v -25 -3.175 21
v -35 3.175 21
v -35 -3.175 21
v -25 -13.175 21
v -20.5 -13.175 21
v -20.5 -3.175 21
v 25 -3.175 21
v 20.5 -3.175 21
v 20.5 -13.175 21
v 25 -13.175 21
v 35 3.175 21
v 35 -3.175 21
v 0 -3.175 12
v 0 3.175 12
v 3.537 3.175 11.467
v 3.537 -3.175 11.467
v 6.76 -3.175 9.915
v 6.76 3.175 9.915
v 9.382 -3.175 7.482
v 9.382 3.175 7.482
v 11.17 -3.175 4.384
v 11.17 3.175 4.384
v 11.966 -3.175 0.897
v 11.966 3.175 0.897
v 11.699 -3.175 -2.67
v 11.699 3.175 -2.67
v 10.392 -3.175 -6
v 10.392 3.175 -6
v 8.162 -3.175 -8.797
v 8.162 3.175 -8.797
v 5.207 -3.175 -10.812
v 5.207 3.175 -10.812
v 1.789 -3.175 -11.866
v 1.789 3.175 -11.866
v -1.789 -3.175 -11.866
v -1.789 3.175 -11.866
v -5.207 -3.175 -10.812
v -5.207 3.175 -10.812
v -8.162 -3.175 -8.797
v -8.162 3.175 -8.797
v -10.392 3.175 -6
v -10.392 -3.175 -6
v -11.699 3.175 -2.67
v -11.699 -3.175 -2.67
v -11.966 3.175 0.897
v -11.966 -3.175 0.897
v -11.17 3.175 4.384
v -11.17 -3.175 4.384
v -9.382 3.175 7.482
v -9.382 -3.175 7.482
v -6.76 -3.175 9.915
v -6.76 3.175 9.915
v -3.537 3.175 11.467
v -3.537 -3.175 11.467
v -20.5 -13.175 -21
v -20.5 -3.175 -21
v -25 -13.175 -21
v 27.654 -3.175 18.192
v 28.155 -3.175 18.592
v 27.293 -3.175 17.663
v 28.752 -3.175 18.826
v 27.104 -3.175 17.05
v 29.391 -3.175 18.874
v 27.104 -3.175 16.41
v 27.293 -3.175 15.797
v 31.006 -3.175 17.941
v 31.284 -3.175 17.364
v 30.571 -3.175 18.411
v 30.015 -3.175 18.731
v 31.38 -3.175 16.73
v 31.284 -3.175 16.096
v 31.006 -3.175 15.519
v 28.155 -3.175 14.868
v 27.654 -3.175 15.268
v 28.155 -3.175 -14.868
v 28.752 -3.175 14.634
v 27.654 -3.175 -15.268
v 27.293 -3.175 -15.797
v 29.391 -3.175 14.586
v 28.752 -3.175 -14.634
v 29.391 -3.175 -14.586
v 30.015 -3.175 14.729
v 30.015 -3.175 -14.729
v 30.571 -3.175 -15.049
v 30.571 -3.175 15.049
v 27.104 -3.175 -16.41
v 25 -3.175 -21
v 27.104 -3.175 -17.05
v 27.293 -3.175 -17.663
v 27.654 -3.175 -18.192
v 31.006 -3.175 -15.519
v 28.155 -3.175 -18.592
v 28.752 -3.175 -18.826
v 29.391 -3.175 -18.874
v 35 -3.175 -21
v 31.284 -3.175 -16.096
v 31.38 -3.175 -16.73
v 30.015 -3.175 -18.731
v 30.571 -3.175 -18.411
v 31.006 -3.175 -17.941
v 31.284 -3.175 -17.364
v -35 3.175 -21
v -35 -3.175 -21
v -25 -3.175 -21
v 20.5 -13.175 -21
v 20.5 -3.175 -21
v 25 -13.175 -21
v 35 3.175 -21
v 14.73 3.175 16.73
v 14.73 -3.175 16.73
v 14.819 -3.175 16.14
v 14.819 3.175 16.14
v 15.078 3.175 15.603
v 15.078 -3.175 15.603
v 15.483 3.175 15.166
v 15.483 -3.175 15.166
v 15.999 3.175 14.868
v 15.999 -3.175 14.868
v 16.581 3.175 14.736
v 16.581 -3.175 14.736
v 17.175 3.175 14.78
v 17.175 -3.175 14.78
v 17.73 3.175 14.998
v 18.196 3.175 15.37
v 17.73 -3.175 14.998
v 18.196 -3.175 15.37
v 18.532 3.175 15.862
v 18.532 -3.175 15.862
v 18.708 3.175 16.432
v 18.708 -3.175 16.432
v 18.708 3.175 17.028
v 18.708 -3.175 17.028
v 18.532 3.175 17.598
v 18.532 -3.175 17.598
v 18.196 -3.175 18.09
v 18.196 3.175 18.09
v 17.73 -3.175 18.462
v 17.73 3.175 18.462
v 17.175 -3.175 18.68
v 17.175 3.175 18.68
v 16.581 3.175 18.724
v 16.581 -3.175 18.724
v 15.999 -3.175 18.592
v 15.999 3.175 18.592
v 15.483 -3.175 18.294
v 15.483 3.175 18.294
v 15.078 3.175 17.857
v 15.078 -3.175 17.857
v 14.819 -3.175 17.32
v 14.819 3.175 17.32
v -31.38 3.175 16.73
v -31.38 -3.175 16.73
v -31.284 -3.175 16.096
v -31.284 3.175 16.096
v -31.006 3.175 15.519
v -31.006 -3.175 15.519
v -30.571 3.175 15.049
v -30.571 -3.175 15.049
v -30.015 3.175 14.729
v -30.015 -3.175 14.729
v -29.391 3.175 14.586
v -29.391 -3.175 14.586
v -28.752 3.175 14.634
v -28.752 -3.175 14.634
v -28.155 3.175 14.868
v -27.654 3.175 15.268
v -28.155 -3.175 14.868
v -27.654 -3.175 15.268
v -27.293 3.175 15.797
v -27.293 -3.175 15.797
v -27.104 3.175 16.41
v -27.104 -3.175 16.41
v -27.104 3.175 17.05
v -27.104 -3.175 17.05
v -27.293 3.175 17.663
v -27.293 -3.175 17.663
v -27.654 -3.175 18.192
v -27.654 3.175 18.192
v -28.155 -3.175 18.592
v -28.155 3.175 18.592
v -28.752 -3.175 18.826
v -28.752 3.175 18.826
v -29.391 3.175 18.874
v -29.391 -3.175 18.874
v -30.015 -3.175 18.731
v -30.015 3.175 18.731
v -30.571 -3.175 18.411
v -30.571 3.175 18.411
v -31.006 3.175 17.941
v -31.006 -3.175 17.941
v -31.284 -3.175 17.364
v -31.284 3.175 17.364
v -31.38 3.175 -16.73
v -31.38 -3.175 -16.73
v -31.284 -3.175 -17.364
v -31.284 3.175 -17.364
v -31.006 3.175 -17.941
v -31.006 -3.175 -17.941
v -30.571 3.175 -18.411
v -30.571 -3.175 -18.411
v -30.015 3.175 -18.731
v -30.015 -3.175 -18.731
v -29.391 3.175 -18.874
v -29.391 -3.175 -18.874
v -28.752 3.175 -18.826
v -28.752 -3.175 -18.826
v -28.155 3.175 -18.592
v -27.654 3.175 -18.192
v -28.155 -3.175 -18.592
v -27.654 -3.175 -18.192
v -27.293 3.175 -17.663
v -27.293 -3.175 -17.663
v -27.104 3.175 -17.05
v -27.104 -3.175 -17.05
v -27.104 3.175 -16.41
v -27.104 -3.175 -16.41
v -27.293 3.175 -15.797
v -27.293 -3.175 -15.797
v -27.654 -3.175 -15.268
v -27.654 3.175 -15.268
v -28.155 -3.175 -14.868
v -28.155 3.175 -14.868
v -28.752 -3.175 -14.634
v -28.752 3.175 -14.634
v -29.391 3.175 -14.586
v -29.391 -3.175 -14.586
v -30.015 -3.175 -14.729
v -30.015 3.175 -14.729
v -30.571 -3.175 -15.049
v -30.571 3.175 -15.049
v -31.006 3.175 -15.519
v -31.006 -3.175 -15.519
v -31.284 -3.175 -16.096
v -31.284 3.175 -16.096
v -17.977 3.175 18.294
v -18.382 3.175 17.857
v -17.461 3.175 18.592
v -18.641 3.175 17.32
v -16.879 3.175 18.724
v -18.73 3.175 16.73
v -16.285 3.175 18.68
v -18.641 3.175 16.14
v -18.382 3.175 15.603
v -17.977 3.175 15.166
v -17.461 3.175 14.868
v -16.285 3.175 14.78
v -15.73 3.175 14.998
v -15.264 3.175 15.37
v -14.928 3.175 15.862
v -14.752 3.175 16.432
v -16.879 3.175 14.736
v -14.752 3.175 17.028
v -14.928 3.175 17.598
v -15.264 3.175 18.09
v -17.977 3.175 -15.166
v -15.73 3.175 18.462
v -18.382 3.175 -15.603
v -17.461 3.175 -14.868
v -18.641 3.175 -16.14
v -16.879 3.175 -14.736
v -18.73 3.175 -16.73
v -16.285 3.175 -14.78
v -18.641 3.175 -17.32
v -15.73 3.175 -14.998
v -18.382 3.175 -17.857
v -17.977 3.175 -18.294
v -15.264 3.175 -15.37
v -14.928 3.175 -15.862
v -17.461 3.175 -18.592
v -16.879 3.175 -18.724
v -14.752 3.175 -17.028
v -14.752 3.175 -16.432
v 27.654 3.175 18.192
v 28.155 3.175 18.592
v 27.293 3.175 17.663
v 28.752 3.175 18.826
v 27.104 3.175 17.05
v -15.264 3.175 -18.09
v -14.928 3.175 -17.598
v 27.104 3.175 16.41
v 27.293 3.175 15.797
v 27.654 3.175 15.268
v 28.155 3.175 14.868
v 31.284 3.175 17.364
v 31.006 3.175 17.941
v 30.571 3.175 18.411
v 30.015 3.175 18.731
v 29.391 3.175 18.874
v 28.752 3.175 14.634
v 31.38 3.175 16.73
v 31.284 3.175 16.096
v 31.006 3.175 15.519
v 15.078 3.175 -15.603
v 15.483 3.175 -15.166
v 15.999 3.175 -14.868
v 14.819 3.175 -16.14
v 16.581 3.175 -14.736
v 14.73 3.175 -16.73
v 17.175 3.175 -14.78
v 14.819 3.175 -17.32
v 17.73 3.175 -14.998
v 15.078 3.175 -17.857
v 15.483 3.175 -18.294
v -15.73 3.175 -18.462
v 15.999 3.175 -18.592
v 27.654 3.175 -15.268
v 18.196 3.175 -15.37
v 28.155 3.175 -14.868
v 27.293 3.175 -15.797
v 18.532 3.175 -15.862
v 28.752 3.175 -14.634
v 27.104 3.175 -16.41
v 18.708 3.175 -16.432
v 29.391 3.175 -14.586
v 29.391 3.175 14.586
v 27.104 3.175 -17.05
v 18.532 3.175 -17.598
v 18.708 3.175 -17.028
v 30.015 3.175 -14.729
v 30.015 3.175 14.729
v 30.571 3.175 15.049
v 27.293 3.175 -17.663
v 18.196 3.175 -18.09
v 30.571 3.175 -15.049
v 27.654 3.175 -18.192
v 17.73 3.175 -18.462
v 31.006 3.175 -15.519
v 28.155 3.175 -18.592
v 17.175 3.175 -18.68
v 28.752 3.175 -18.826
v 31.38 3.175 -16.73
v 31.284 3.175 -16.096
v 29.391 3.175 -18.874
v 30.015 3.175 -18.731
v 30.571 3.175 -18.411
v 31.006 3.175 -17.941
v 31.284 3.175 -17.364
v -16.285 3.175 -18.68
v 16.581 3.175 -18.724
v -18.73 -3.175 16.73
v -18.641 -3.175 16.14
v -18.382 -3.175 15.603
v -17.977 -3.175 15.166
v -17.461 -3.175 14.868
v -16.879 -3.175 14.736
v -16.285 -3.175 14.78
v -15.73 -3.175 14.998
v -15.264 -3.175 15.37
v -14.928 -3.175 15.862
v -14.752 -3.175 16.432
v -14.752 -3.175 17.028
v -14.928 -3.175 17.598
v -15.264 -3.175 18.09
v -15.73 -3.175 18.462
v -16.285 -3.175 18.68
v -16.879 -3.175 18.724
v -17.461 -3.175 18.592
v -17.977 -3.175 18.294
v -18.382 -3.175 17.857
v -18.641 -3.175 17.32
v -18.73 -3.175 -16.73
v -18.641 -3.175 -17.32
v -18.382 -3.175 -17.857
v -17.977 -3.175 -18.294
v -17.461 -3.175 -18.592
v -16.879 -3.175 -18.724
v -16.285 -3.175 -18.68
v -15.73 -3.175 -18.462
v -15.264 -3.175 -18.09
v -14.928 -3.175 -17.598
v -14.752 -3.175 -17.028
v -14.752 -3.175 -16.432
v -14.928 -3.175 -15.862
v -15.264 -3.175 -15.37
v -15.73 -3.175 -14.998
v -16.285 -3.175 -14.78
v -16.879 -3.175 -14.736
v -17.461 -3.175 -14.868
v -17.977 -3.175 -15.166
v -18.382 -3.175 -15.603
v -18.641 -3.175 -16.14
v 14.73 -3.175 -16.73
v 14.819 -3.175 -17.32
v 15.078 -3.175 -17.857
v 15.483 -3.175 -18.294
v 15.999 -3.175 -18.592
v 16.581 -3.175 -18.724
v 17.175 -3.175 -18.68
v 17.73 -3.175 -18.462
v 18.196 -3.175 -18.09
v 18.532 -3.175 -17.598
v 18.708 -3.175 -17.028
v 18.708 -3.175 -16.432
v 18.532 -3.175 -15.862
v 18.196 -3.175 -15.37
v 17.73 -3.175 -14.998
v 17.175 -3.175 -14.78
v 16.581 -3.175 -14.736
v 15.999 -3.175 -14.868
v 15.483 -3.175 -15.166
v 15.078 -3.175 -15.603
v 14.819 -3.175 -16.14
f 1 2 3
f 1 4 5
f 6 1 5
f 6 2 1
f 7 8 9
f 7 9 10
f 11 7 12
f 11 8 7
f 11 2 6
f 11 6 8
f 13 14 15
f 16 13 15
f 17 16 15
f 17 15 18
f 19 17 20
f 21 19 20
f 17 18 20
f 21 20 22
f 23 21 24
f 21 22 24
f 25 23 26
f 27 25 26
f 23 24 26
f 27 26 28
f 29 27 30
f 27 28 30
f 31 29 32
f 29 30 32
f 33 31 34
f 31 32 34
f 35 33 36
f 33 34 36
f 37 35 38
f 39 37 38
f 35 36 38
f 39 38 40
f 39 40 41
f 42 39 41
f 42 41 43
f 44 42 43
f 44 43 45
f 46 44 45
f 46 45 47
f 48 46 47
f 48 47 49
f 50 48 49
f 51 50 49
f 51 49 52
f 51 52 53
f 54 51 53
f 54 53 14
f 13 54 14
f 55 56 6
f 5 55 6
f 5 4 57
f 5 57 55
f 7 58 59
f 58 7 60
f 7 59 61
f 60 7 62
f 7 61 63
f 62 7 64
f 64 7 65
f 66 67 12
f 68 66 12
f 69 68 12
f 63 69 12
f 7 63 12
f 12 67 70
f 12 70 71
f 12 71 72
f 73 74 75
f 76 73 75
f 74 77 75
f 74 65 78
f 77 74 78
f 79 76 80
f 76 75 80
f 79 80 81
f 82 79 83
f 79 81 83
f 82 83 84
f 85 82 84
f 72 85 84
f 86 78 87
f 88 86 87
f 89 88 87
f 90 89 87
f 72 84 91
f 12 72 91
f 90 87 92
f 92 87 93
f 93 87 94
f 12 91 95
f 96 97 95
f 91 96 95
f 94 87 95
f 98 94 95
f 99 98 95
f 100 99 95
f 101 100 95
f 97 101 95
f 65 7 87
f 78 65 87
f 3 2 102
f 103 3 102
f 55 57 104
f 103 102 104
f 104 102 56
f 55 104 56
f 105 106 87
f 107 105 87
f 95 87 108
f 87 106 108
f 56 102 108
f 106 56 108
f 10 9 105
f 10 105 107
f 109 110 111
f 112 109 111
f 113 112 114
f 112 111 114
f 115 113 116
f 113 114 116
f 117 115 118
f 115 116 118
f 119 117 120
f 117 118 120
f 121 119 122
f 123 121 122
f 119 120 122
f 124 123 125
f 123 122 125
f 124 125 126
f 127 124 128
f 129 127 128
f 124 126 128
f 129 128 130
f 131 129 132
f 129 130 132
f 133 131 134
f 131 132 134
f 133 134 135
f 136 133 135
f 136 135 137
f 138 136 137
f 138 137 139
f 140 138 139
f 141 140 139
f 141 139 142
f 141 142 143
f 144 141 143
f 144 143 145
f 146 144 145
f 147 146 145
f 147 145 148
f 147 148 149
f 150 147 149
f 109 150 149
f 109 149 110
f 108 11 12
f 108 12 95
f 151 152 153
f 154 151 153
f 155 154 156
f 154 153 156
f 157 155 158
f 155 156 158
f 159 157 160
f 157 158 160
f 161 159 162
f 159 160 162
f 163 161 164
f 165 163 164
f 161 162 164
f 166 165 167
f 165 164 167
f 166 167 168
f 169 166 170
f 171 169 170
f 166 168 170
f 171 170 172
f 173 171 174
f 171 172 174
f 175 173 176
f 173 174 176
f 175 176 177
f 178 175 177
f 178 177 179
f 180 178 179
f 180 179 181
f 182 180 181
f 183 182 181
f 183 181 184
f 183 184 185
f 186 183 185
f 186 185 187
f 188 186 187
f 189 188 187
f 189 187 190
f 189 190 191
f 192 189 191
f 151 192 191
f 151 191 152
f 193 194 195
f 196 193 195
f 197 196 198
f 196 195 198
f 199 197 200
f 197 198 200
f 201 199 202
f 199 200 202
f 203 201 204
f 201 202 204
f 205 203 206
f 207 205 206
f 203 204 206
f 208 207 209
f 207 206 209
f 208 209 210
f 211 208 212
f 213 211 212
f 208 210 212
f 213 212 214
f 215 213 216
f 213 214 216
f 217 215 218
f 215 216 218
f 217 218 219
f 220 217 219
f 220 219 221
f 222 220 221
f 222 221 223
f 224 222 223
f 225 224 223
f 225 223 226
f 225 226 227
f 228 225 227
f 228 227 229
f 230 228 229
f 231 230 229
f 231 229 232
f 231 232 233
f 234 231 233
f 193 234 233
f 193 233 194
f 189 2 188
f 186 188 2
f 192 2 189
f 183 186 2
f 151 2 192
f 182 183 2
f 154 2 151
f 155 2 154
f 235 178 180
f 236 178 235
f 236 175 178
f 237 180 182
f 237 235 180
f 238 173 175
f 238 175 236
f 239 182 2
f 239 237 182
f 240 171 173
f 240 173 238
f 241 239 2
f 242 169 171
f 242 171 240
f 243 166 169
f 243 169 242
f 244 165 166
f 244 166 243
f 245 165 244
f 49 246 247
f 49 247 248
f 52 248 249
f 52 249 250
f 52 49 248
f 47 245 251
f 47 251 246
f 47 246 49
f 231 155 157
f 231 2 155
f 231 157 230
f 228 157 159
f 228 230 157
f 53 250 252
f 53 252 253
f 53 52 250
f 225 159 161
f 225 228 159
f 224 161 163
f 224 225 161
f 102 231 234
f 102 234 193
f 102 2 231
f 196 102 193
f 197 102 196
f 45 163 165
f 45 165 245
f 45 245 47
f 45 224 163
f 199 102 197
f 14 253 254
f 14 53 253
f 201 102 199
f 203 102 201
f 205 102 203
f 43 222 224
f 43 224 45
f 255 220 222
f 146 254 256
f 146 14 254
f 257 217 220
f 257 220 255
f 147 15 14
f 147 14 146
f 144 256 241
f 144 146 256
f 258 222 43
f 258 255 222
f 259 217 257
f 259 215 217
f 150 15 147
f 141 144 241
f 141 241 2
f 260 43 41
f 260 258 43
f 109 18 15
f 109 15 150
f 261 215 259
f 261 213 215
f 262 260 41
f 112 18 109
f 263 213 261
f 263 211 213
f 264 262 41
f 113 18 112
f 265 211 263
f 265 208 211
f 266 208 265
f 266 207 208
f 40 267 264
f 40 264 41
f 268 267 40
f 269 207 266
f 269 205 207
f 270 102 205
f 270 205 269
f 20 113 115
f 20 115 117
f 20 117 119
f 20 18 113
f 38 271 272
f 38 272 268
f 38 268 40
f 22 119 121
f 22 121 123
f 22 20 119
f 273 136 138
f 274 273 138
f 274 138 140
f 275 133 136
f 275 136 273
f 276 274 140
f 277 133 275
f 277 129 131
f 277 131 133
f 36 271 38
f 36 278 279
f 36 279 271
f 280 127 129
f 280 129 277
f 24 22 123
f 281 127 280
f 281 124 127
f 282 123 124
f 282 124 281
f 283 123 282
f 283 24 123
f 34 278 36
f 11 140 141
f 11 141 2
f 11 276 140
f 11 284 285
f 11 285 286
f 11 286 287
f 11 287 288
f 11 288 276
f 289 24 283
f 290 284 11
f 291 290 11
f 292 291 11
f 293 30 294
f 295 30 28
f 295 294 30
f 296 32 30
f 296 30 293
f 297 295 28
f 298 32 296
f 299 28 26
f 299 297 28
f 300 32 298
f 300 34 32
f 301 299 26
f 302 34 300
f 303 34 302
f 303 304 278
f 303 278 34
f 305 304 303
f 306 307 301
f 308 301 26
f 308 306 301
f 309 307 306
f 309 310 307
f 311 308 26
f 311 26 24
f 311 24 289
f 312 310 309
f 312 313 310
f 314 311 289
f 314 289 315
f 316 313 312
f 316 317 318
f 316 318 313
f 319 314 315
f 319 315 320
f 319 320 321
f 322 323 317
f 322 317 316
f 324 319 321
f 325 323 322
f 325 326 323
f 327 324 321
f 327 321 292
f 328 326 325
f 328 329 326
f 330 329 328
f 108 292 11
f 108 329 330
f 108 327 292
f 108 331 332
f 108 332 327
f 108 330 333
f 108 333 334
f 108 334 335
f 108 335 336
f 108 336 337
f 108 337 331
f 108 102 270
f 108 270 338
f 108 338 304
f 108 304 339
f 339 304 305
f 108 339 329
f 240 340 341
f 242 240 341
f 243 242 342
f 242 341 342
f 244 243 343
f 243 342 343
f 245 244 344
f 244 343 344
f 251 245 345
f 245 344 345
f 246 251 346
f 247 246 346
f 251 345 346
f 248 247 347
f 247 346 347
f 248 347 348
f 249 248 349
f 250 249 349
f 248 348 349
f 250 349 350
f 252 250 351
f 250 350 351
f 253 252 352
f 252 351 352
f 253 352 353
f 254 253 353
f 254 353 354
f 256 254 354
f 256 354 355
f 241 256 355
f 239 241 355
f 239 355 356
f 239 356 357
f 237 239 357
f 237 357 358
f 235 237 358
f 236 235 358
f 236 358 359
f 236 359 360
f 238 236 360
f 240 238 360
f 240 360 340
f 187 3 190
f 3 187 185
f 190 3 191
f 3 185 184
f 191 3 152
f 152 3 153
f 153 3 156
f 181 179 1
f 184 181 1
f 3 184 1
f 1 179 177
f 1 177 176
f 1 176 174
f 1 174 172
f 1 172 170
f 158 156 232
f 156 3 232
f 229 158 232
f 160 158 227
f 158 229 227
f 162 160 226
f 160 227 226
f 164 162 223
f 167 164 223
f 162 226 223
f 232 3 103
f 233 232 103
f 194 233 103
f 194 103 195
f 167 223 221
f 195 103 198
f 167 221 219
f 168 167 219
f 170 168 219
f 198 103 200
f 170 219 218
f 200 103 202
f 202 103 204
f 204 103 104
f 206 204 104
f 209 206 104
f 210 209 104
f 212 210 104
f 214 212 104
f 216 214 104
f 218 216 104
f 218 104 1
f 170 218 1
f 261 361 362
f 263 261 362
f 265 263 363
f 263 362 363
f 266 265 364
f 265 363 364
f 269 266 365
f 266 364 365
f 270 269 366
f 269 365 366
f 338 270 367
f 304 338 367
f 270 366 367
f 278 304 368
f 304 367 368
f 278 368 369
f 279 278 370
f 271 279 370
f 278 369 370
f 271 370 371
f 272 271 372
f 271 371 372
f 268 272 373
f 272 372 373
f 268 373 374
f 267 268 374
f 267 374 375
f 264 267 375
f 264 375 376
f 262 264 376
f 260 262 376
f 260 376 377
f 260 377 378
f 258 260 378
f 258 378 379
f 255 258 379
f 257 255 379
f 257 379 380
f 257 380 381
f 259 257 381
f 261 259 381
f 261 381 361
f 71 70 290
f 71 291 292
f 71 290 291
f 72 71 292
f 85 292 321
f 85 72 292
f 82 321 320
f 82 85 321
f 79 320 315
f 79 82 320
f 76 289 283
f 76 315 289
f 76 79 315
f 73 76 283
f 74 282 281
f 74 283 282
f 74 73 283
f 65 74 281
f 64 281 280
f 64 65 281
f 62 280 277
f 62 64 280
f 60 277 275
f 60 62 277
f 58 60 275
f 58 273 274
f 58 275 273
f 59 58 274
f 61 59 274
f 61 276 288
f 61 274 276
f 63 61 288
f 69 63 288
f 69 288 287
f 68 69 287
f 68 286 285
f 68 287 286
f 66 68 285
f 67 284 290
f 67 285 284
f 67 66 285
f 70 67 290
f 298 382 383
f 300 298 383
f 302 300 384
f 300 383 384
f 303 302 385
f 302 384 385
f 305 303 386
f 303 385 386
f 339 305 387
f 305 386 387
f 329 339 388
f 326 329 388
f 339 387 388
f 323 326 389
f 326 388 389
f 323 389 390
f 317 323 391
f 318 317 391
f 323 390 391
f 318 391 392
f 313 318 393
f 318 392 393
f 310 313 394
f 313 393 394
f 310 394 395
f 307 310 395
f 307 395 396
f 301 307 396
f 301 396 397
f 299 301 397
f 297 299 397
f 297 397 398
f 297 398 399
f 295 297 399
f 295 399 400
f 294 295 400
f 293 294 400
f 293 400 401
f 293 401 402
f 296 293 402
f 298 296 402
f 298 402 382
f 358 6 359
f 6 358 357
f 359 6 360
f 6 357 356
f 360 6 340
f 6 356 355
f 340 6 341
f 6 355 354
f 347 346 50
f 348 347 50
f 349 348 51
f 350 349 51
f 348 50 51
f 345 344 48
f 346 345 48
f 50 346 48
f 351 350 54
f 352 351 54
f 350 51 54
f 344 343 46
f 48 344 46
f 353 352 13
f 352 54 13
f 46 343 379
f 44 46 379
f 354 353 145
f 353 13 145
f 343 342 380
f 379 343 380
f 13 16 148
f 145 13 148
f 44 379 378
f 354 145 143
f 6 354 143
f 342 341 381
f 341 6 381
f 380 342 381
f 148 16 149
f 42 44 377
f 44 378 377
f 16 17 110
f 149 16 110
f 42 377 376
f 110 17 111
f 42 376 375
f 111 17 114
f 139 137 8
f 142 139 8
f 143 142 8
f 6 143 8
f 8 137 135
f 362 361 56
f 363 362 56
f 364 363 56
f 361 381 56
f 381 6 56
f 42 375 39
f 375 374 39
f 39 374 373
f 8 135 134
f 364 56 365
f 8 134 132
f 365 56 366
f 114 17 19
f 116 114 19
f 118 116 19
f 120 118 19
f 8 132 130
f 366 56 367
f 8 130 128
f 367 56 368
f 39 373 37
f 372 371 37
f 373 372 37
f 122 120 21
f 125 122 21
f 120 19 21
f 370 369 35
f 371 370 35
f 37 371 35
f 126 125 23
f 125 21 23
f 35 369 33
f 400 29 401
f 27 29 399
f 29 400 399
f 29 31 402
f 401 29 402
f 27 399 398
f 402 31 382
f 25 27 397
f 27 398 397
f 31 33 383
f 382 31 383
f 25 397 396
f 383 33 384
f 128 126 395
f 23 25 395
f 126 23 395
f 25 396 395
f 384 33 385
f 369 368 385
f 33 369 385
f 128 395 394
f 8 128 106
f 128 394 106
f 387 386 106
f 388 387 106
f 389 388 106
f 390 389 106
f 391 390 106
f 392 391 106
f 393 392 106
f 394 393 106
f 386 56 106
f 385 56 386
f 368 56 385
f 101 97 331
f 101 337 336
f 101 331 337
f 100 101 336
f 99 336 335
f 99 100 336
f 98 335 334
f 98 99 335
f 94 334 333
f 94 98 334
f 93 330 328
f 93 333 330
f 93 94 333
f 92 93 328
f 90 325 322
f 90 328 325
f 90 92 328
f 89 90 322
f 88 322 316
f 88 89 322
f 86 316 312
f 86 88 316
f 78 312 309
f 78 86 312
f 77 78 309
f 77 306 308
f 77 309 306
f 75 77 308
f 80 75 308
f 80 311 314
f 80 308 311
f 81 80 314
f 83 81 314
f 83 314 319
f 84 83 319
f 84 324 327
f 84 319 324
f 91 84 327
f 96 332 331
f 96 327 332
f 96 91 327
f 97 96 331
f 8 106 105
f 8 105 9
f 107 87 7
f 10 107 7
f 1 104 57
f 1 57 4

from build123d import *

# Parameters (mm, degrees)
SKETCH1_W             = 70
SKETCH1_H             = 42
BOSS_EXTRUDE1_DEPTH   = 3.175
SKETCH3_W             = 4.5
SKETCH3_H             = 42
BOSS_EXTRUDE2_DEPTH   = 10
F_1_0MM_DOWEL_HOLE1_D = 4
F_1_0MM_DOWEL_HOLE2_D = 4.3
SKETCH4_R             = 12
CUT_EXTRUDE1_DEPTH    = 44.969563336


with BuildPart() as part:
    # Sketch1 → Boss-Extrude1 (new, symmetric)
    with BuildSketch(Plane(origin=(0, 0, 0), x_dir=(1, 0, 0), z_dir=(0, 1, 0))):
        Rectangle(SKETCH1_W, SKETCH1_H)
    extrude(amount=BOSS_EXTRUDE1_DEPTH, both=True)

    # Sketch3 → Boss-Extrude2 (add)
    with BuildSketch(Plane.XZ.offset(3.175)):
        with Locations((-22.75, 0)):
            Rectangle(SKETCH3_W, SKETCH3_H)
        with Locations((22.75, 0)):
            Rectangle(SKETCH3_W, SKETCH3_H)
    extrude(amount=BOSS_EXTRUDE2_DEPTH)

    # Ø1.0mm Dowel Hole1 (through all)
    with Locations(Plane(origin=(0, 3.175, 0), x_dir=(1, 0, 0), z_dir=(0, 1, 0))):
        with Locations((-16.73, 16.73), (16.73, 16.73), (16.73, -16.73), (-16.73, -16.73)):
            Hole(F_1_0MM_DOWEL_HOLE1_D / 2)

    # Ø1.0mm Dowel Hole2 (through all)
    with Locations(Plane(origin=(0, 3.175, 0), x_dir=(1, 0, 0), z_dir=(0, 1, 0))):
        with Locations((-29.23, 16.73), (-29.23, -16.73)):
            f_1_0mm_dowel_hole2 = Hole(F_1_0MM_DOWEL_HOLE2_D / 2)

    # Mirror1: Ø1.0mm Dowel Hole2 across plane
    add(f_1_0mm_dowel_hole2.mirror(Plane(origin=(0, 0, 0), x_dir=(0, 0, 1), z_dir=(1, 0, 0))), mode=Mode.SUBTRACT)

    # Sketch4 → Cut-Extrude1 (cut, through all)
    with BuildSketch(Plane(origin=(0, 3.175, 0), x_dir=(1, 0, 0), z_dir=(0, 1, 0))):
        with Locations(Location((0, 0, 0), (0, 0, 270))):
            Circle(SKETCH4_R)
    extrude(amount=-CUT_EXTRUDE1_DEPTH, mode=Mode.SUBTRACT)


solid = part.part
